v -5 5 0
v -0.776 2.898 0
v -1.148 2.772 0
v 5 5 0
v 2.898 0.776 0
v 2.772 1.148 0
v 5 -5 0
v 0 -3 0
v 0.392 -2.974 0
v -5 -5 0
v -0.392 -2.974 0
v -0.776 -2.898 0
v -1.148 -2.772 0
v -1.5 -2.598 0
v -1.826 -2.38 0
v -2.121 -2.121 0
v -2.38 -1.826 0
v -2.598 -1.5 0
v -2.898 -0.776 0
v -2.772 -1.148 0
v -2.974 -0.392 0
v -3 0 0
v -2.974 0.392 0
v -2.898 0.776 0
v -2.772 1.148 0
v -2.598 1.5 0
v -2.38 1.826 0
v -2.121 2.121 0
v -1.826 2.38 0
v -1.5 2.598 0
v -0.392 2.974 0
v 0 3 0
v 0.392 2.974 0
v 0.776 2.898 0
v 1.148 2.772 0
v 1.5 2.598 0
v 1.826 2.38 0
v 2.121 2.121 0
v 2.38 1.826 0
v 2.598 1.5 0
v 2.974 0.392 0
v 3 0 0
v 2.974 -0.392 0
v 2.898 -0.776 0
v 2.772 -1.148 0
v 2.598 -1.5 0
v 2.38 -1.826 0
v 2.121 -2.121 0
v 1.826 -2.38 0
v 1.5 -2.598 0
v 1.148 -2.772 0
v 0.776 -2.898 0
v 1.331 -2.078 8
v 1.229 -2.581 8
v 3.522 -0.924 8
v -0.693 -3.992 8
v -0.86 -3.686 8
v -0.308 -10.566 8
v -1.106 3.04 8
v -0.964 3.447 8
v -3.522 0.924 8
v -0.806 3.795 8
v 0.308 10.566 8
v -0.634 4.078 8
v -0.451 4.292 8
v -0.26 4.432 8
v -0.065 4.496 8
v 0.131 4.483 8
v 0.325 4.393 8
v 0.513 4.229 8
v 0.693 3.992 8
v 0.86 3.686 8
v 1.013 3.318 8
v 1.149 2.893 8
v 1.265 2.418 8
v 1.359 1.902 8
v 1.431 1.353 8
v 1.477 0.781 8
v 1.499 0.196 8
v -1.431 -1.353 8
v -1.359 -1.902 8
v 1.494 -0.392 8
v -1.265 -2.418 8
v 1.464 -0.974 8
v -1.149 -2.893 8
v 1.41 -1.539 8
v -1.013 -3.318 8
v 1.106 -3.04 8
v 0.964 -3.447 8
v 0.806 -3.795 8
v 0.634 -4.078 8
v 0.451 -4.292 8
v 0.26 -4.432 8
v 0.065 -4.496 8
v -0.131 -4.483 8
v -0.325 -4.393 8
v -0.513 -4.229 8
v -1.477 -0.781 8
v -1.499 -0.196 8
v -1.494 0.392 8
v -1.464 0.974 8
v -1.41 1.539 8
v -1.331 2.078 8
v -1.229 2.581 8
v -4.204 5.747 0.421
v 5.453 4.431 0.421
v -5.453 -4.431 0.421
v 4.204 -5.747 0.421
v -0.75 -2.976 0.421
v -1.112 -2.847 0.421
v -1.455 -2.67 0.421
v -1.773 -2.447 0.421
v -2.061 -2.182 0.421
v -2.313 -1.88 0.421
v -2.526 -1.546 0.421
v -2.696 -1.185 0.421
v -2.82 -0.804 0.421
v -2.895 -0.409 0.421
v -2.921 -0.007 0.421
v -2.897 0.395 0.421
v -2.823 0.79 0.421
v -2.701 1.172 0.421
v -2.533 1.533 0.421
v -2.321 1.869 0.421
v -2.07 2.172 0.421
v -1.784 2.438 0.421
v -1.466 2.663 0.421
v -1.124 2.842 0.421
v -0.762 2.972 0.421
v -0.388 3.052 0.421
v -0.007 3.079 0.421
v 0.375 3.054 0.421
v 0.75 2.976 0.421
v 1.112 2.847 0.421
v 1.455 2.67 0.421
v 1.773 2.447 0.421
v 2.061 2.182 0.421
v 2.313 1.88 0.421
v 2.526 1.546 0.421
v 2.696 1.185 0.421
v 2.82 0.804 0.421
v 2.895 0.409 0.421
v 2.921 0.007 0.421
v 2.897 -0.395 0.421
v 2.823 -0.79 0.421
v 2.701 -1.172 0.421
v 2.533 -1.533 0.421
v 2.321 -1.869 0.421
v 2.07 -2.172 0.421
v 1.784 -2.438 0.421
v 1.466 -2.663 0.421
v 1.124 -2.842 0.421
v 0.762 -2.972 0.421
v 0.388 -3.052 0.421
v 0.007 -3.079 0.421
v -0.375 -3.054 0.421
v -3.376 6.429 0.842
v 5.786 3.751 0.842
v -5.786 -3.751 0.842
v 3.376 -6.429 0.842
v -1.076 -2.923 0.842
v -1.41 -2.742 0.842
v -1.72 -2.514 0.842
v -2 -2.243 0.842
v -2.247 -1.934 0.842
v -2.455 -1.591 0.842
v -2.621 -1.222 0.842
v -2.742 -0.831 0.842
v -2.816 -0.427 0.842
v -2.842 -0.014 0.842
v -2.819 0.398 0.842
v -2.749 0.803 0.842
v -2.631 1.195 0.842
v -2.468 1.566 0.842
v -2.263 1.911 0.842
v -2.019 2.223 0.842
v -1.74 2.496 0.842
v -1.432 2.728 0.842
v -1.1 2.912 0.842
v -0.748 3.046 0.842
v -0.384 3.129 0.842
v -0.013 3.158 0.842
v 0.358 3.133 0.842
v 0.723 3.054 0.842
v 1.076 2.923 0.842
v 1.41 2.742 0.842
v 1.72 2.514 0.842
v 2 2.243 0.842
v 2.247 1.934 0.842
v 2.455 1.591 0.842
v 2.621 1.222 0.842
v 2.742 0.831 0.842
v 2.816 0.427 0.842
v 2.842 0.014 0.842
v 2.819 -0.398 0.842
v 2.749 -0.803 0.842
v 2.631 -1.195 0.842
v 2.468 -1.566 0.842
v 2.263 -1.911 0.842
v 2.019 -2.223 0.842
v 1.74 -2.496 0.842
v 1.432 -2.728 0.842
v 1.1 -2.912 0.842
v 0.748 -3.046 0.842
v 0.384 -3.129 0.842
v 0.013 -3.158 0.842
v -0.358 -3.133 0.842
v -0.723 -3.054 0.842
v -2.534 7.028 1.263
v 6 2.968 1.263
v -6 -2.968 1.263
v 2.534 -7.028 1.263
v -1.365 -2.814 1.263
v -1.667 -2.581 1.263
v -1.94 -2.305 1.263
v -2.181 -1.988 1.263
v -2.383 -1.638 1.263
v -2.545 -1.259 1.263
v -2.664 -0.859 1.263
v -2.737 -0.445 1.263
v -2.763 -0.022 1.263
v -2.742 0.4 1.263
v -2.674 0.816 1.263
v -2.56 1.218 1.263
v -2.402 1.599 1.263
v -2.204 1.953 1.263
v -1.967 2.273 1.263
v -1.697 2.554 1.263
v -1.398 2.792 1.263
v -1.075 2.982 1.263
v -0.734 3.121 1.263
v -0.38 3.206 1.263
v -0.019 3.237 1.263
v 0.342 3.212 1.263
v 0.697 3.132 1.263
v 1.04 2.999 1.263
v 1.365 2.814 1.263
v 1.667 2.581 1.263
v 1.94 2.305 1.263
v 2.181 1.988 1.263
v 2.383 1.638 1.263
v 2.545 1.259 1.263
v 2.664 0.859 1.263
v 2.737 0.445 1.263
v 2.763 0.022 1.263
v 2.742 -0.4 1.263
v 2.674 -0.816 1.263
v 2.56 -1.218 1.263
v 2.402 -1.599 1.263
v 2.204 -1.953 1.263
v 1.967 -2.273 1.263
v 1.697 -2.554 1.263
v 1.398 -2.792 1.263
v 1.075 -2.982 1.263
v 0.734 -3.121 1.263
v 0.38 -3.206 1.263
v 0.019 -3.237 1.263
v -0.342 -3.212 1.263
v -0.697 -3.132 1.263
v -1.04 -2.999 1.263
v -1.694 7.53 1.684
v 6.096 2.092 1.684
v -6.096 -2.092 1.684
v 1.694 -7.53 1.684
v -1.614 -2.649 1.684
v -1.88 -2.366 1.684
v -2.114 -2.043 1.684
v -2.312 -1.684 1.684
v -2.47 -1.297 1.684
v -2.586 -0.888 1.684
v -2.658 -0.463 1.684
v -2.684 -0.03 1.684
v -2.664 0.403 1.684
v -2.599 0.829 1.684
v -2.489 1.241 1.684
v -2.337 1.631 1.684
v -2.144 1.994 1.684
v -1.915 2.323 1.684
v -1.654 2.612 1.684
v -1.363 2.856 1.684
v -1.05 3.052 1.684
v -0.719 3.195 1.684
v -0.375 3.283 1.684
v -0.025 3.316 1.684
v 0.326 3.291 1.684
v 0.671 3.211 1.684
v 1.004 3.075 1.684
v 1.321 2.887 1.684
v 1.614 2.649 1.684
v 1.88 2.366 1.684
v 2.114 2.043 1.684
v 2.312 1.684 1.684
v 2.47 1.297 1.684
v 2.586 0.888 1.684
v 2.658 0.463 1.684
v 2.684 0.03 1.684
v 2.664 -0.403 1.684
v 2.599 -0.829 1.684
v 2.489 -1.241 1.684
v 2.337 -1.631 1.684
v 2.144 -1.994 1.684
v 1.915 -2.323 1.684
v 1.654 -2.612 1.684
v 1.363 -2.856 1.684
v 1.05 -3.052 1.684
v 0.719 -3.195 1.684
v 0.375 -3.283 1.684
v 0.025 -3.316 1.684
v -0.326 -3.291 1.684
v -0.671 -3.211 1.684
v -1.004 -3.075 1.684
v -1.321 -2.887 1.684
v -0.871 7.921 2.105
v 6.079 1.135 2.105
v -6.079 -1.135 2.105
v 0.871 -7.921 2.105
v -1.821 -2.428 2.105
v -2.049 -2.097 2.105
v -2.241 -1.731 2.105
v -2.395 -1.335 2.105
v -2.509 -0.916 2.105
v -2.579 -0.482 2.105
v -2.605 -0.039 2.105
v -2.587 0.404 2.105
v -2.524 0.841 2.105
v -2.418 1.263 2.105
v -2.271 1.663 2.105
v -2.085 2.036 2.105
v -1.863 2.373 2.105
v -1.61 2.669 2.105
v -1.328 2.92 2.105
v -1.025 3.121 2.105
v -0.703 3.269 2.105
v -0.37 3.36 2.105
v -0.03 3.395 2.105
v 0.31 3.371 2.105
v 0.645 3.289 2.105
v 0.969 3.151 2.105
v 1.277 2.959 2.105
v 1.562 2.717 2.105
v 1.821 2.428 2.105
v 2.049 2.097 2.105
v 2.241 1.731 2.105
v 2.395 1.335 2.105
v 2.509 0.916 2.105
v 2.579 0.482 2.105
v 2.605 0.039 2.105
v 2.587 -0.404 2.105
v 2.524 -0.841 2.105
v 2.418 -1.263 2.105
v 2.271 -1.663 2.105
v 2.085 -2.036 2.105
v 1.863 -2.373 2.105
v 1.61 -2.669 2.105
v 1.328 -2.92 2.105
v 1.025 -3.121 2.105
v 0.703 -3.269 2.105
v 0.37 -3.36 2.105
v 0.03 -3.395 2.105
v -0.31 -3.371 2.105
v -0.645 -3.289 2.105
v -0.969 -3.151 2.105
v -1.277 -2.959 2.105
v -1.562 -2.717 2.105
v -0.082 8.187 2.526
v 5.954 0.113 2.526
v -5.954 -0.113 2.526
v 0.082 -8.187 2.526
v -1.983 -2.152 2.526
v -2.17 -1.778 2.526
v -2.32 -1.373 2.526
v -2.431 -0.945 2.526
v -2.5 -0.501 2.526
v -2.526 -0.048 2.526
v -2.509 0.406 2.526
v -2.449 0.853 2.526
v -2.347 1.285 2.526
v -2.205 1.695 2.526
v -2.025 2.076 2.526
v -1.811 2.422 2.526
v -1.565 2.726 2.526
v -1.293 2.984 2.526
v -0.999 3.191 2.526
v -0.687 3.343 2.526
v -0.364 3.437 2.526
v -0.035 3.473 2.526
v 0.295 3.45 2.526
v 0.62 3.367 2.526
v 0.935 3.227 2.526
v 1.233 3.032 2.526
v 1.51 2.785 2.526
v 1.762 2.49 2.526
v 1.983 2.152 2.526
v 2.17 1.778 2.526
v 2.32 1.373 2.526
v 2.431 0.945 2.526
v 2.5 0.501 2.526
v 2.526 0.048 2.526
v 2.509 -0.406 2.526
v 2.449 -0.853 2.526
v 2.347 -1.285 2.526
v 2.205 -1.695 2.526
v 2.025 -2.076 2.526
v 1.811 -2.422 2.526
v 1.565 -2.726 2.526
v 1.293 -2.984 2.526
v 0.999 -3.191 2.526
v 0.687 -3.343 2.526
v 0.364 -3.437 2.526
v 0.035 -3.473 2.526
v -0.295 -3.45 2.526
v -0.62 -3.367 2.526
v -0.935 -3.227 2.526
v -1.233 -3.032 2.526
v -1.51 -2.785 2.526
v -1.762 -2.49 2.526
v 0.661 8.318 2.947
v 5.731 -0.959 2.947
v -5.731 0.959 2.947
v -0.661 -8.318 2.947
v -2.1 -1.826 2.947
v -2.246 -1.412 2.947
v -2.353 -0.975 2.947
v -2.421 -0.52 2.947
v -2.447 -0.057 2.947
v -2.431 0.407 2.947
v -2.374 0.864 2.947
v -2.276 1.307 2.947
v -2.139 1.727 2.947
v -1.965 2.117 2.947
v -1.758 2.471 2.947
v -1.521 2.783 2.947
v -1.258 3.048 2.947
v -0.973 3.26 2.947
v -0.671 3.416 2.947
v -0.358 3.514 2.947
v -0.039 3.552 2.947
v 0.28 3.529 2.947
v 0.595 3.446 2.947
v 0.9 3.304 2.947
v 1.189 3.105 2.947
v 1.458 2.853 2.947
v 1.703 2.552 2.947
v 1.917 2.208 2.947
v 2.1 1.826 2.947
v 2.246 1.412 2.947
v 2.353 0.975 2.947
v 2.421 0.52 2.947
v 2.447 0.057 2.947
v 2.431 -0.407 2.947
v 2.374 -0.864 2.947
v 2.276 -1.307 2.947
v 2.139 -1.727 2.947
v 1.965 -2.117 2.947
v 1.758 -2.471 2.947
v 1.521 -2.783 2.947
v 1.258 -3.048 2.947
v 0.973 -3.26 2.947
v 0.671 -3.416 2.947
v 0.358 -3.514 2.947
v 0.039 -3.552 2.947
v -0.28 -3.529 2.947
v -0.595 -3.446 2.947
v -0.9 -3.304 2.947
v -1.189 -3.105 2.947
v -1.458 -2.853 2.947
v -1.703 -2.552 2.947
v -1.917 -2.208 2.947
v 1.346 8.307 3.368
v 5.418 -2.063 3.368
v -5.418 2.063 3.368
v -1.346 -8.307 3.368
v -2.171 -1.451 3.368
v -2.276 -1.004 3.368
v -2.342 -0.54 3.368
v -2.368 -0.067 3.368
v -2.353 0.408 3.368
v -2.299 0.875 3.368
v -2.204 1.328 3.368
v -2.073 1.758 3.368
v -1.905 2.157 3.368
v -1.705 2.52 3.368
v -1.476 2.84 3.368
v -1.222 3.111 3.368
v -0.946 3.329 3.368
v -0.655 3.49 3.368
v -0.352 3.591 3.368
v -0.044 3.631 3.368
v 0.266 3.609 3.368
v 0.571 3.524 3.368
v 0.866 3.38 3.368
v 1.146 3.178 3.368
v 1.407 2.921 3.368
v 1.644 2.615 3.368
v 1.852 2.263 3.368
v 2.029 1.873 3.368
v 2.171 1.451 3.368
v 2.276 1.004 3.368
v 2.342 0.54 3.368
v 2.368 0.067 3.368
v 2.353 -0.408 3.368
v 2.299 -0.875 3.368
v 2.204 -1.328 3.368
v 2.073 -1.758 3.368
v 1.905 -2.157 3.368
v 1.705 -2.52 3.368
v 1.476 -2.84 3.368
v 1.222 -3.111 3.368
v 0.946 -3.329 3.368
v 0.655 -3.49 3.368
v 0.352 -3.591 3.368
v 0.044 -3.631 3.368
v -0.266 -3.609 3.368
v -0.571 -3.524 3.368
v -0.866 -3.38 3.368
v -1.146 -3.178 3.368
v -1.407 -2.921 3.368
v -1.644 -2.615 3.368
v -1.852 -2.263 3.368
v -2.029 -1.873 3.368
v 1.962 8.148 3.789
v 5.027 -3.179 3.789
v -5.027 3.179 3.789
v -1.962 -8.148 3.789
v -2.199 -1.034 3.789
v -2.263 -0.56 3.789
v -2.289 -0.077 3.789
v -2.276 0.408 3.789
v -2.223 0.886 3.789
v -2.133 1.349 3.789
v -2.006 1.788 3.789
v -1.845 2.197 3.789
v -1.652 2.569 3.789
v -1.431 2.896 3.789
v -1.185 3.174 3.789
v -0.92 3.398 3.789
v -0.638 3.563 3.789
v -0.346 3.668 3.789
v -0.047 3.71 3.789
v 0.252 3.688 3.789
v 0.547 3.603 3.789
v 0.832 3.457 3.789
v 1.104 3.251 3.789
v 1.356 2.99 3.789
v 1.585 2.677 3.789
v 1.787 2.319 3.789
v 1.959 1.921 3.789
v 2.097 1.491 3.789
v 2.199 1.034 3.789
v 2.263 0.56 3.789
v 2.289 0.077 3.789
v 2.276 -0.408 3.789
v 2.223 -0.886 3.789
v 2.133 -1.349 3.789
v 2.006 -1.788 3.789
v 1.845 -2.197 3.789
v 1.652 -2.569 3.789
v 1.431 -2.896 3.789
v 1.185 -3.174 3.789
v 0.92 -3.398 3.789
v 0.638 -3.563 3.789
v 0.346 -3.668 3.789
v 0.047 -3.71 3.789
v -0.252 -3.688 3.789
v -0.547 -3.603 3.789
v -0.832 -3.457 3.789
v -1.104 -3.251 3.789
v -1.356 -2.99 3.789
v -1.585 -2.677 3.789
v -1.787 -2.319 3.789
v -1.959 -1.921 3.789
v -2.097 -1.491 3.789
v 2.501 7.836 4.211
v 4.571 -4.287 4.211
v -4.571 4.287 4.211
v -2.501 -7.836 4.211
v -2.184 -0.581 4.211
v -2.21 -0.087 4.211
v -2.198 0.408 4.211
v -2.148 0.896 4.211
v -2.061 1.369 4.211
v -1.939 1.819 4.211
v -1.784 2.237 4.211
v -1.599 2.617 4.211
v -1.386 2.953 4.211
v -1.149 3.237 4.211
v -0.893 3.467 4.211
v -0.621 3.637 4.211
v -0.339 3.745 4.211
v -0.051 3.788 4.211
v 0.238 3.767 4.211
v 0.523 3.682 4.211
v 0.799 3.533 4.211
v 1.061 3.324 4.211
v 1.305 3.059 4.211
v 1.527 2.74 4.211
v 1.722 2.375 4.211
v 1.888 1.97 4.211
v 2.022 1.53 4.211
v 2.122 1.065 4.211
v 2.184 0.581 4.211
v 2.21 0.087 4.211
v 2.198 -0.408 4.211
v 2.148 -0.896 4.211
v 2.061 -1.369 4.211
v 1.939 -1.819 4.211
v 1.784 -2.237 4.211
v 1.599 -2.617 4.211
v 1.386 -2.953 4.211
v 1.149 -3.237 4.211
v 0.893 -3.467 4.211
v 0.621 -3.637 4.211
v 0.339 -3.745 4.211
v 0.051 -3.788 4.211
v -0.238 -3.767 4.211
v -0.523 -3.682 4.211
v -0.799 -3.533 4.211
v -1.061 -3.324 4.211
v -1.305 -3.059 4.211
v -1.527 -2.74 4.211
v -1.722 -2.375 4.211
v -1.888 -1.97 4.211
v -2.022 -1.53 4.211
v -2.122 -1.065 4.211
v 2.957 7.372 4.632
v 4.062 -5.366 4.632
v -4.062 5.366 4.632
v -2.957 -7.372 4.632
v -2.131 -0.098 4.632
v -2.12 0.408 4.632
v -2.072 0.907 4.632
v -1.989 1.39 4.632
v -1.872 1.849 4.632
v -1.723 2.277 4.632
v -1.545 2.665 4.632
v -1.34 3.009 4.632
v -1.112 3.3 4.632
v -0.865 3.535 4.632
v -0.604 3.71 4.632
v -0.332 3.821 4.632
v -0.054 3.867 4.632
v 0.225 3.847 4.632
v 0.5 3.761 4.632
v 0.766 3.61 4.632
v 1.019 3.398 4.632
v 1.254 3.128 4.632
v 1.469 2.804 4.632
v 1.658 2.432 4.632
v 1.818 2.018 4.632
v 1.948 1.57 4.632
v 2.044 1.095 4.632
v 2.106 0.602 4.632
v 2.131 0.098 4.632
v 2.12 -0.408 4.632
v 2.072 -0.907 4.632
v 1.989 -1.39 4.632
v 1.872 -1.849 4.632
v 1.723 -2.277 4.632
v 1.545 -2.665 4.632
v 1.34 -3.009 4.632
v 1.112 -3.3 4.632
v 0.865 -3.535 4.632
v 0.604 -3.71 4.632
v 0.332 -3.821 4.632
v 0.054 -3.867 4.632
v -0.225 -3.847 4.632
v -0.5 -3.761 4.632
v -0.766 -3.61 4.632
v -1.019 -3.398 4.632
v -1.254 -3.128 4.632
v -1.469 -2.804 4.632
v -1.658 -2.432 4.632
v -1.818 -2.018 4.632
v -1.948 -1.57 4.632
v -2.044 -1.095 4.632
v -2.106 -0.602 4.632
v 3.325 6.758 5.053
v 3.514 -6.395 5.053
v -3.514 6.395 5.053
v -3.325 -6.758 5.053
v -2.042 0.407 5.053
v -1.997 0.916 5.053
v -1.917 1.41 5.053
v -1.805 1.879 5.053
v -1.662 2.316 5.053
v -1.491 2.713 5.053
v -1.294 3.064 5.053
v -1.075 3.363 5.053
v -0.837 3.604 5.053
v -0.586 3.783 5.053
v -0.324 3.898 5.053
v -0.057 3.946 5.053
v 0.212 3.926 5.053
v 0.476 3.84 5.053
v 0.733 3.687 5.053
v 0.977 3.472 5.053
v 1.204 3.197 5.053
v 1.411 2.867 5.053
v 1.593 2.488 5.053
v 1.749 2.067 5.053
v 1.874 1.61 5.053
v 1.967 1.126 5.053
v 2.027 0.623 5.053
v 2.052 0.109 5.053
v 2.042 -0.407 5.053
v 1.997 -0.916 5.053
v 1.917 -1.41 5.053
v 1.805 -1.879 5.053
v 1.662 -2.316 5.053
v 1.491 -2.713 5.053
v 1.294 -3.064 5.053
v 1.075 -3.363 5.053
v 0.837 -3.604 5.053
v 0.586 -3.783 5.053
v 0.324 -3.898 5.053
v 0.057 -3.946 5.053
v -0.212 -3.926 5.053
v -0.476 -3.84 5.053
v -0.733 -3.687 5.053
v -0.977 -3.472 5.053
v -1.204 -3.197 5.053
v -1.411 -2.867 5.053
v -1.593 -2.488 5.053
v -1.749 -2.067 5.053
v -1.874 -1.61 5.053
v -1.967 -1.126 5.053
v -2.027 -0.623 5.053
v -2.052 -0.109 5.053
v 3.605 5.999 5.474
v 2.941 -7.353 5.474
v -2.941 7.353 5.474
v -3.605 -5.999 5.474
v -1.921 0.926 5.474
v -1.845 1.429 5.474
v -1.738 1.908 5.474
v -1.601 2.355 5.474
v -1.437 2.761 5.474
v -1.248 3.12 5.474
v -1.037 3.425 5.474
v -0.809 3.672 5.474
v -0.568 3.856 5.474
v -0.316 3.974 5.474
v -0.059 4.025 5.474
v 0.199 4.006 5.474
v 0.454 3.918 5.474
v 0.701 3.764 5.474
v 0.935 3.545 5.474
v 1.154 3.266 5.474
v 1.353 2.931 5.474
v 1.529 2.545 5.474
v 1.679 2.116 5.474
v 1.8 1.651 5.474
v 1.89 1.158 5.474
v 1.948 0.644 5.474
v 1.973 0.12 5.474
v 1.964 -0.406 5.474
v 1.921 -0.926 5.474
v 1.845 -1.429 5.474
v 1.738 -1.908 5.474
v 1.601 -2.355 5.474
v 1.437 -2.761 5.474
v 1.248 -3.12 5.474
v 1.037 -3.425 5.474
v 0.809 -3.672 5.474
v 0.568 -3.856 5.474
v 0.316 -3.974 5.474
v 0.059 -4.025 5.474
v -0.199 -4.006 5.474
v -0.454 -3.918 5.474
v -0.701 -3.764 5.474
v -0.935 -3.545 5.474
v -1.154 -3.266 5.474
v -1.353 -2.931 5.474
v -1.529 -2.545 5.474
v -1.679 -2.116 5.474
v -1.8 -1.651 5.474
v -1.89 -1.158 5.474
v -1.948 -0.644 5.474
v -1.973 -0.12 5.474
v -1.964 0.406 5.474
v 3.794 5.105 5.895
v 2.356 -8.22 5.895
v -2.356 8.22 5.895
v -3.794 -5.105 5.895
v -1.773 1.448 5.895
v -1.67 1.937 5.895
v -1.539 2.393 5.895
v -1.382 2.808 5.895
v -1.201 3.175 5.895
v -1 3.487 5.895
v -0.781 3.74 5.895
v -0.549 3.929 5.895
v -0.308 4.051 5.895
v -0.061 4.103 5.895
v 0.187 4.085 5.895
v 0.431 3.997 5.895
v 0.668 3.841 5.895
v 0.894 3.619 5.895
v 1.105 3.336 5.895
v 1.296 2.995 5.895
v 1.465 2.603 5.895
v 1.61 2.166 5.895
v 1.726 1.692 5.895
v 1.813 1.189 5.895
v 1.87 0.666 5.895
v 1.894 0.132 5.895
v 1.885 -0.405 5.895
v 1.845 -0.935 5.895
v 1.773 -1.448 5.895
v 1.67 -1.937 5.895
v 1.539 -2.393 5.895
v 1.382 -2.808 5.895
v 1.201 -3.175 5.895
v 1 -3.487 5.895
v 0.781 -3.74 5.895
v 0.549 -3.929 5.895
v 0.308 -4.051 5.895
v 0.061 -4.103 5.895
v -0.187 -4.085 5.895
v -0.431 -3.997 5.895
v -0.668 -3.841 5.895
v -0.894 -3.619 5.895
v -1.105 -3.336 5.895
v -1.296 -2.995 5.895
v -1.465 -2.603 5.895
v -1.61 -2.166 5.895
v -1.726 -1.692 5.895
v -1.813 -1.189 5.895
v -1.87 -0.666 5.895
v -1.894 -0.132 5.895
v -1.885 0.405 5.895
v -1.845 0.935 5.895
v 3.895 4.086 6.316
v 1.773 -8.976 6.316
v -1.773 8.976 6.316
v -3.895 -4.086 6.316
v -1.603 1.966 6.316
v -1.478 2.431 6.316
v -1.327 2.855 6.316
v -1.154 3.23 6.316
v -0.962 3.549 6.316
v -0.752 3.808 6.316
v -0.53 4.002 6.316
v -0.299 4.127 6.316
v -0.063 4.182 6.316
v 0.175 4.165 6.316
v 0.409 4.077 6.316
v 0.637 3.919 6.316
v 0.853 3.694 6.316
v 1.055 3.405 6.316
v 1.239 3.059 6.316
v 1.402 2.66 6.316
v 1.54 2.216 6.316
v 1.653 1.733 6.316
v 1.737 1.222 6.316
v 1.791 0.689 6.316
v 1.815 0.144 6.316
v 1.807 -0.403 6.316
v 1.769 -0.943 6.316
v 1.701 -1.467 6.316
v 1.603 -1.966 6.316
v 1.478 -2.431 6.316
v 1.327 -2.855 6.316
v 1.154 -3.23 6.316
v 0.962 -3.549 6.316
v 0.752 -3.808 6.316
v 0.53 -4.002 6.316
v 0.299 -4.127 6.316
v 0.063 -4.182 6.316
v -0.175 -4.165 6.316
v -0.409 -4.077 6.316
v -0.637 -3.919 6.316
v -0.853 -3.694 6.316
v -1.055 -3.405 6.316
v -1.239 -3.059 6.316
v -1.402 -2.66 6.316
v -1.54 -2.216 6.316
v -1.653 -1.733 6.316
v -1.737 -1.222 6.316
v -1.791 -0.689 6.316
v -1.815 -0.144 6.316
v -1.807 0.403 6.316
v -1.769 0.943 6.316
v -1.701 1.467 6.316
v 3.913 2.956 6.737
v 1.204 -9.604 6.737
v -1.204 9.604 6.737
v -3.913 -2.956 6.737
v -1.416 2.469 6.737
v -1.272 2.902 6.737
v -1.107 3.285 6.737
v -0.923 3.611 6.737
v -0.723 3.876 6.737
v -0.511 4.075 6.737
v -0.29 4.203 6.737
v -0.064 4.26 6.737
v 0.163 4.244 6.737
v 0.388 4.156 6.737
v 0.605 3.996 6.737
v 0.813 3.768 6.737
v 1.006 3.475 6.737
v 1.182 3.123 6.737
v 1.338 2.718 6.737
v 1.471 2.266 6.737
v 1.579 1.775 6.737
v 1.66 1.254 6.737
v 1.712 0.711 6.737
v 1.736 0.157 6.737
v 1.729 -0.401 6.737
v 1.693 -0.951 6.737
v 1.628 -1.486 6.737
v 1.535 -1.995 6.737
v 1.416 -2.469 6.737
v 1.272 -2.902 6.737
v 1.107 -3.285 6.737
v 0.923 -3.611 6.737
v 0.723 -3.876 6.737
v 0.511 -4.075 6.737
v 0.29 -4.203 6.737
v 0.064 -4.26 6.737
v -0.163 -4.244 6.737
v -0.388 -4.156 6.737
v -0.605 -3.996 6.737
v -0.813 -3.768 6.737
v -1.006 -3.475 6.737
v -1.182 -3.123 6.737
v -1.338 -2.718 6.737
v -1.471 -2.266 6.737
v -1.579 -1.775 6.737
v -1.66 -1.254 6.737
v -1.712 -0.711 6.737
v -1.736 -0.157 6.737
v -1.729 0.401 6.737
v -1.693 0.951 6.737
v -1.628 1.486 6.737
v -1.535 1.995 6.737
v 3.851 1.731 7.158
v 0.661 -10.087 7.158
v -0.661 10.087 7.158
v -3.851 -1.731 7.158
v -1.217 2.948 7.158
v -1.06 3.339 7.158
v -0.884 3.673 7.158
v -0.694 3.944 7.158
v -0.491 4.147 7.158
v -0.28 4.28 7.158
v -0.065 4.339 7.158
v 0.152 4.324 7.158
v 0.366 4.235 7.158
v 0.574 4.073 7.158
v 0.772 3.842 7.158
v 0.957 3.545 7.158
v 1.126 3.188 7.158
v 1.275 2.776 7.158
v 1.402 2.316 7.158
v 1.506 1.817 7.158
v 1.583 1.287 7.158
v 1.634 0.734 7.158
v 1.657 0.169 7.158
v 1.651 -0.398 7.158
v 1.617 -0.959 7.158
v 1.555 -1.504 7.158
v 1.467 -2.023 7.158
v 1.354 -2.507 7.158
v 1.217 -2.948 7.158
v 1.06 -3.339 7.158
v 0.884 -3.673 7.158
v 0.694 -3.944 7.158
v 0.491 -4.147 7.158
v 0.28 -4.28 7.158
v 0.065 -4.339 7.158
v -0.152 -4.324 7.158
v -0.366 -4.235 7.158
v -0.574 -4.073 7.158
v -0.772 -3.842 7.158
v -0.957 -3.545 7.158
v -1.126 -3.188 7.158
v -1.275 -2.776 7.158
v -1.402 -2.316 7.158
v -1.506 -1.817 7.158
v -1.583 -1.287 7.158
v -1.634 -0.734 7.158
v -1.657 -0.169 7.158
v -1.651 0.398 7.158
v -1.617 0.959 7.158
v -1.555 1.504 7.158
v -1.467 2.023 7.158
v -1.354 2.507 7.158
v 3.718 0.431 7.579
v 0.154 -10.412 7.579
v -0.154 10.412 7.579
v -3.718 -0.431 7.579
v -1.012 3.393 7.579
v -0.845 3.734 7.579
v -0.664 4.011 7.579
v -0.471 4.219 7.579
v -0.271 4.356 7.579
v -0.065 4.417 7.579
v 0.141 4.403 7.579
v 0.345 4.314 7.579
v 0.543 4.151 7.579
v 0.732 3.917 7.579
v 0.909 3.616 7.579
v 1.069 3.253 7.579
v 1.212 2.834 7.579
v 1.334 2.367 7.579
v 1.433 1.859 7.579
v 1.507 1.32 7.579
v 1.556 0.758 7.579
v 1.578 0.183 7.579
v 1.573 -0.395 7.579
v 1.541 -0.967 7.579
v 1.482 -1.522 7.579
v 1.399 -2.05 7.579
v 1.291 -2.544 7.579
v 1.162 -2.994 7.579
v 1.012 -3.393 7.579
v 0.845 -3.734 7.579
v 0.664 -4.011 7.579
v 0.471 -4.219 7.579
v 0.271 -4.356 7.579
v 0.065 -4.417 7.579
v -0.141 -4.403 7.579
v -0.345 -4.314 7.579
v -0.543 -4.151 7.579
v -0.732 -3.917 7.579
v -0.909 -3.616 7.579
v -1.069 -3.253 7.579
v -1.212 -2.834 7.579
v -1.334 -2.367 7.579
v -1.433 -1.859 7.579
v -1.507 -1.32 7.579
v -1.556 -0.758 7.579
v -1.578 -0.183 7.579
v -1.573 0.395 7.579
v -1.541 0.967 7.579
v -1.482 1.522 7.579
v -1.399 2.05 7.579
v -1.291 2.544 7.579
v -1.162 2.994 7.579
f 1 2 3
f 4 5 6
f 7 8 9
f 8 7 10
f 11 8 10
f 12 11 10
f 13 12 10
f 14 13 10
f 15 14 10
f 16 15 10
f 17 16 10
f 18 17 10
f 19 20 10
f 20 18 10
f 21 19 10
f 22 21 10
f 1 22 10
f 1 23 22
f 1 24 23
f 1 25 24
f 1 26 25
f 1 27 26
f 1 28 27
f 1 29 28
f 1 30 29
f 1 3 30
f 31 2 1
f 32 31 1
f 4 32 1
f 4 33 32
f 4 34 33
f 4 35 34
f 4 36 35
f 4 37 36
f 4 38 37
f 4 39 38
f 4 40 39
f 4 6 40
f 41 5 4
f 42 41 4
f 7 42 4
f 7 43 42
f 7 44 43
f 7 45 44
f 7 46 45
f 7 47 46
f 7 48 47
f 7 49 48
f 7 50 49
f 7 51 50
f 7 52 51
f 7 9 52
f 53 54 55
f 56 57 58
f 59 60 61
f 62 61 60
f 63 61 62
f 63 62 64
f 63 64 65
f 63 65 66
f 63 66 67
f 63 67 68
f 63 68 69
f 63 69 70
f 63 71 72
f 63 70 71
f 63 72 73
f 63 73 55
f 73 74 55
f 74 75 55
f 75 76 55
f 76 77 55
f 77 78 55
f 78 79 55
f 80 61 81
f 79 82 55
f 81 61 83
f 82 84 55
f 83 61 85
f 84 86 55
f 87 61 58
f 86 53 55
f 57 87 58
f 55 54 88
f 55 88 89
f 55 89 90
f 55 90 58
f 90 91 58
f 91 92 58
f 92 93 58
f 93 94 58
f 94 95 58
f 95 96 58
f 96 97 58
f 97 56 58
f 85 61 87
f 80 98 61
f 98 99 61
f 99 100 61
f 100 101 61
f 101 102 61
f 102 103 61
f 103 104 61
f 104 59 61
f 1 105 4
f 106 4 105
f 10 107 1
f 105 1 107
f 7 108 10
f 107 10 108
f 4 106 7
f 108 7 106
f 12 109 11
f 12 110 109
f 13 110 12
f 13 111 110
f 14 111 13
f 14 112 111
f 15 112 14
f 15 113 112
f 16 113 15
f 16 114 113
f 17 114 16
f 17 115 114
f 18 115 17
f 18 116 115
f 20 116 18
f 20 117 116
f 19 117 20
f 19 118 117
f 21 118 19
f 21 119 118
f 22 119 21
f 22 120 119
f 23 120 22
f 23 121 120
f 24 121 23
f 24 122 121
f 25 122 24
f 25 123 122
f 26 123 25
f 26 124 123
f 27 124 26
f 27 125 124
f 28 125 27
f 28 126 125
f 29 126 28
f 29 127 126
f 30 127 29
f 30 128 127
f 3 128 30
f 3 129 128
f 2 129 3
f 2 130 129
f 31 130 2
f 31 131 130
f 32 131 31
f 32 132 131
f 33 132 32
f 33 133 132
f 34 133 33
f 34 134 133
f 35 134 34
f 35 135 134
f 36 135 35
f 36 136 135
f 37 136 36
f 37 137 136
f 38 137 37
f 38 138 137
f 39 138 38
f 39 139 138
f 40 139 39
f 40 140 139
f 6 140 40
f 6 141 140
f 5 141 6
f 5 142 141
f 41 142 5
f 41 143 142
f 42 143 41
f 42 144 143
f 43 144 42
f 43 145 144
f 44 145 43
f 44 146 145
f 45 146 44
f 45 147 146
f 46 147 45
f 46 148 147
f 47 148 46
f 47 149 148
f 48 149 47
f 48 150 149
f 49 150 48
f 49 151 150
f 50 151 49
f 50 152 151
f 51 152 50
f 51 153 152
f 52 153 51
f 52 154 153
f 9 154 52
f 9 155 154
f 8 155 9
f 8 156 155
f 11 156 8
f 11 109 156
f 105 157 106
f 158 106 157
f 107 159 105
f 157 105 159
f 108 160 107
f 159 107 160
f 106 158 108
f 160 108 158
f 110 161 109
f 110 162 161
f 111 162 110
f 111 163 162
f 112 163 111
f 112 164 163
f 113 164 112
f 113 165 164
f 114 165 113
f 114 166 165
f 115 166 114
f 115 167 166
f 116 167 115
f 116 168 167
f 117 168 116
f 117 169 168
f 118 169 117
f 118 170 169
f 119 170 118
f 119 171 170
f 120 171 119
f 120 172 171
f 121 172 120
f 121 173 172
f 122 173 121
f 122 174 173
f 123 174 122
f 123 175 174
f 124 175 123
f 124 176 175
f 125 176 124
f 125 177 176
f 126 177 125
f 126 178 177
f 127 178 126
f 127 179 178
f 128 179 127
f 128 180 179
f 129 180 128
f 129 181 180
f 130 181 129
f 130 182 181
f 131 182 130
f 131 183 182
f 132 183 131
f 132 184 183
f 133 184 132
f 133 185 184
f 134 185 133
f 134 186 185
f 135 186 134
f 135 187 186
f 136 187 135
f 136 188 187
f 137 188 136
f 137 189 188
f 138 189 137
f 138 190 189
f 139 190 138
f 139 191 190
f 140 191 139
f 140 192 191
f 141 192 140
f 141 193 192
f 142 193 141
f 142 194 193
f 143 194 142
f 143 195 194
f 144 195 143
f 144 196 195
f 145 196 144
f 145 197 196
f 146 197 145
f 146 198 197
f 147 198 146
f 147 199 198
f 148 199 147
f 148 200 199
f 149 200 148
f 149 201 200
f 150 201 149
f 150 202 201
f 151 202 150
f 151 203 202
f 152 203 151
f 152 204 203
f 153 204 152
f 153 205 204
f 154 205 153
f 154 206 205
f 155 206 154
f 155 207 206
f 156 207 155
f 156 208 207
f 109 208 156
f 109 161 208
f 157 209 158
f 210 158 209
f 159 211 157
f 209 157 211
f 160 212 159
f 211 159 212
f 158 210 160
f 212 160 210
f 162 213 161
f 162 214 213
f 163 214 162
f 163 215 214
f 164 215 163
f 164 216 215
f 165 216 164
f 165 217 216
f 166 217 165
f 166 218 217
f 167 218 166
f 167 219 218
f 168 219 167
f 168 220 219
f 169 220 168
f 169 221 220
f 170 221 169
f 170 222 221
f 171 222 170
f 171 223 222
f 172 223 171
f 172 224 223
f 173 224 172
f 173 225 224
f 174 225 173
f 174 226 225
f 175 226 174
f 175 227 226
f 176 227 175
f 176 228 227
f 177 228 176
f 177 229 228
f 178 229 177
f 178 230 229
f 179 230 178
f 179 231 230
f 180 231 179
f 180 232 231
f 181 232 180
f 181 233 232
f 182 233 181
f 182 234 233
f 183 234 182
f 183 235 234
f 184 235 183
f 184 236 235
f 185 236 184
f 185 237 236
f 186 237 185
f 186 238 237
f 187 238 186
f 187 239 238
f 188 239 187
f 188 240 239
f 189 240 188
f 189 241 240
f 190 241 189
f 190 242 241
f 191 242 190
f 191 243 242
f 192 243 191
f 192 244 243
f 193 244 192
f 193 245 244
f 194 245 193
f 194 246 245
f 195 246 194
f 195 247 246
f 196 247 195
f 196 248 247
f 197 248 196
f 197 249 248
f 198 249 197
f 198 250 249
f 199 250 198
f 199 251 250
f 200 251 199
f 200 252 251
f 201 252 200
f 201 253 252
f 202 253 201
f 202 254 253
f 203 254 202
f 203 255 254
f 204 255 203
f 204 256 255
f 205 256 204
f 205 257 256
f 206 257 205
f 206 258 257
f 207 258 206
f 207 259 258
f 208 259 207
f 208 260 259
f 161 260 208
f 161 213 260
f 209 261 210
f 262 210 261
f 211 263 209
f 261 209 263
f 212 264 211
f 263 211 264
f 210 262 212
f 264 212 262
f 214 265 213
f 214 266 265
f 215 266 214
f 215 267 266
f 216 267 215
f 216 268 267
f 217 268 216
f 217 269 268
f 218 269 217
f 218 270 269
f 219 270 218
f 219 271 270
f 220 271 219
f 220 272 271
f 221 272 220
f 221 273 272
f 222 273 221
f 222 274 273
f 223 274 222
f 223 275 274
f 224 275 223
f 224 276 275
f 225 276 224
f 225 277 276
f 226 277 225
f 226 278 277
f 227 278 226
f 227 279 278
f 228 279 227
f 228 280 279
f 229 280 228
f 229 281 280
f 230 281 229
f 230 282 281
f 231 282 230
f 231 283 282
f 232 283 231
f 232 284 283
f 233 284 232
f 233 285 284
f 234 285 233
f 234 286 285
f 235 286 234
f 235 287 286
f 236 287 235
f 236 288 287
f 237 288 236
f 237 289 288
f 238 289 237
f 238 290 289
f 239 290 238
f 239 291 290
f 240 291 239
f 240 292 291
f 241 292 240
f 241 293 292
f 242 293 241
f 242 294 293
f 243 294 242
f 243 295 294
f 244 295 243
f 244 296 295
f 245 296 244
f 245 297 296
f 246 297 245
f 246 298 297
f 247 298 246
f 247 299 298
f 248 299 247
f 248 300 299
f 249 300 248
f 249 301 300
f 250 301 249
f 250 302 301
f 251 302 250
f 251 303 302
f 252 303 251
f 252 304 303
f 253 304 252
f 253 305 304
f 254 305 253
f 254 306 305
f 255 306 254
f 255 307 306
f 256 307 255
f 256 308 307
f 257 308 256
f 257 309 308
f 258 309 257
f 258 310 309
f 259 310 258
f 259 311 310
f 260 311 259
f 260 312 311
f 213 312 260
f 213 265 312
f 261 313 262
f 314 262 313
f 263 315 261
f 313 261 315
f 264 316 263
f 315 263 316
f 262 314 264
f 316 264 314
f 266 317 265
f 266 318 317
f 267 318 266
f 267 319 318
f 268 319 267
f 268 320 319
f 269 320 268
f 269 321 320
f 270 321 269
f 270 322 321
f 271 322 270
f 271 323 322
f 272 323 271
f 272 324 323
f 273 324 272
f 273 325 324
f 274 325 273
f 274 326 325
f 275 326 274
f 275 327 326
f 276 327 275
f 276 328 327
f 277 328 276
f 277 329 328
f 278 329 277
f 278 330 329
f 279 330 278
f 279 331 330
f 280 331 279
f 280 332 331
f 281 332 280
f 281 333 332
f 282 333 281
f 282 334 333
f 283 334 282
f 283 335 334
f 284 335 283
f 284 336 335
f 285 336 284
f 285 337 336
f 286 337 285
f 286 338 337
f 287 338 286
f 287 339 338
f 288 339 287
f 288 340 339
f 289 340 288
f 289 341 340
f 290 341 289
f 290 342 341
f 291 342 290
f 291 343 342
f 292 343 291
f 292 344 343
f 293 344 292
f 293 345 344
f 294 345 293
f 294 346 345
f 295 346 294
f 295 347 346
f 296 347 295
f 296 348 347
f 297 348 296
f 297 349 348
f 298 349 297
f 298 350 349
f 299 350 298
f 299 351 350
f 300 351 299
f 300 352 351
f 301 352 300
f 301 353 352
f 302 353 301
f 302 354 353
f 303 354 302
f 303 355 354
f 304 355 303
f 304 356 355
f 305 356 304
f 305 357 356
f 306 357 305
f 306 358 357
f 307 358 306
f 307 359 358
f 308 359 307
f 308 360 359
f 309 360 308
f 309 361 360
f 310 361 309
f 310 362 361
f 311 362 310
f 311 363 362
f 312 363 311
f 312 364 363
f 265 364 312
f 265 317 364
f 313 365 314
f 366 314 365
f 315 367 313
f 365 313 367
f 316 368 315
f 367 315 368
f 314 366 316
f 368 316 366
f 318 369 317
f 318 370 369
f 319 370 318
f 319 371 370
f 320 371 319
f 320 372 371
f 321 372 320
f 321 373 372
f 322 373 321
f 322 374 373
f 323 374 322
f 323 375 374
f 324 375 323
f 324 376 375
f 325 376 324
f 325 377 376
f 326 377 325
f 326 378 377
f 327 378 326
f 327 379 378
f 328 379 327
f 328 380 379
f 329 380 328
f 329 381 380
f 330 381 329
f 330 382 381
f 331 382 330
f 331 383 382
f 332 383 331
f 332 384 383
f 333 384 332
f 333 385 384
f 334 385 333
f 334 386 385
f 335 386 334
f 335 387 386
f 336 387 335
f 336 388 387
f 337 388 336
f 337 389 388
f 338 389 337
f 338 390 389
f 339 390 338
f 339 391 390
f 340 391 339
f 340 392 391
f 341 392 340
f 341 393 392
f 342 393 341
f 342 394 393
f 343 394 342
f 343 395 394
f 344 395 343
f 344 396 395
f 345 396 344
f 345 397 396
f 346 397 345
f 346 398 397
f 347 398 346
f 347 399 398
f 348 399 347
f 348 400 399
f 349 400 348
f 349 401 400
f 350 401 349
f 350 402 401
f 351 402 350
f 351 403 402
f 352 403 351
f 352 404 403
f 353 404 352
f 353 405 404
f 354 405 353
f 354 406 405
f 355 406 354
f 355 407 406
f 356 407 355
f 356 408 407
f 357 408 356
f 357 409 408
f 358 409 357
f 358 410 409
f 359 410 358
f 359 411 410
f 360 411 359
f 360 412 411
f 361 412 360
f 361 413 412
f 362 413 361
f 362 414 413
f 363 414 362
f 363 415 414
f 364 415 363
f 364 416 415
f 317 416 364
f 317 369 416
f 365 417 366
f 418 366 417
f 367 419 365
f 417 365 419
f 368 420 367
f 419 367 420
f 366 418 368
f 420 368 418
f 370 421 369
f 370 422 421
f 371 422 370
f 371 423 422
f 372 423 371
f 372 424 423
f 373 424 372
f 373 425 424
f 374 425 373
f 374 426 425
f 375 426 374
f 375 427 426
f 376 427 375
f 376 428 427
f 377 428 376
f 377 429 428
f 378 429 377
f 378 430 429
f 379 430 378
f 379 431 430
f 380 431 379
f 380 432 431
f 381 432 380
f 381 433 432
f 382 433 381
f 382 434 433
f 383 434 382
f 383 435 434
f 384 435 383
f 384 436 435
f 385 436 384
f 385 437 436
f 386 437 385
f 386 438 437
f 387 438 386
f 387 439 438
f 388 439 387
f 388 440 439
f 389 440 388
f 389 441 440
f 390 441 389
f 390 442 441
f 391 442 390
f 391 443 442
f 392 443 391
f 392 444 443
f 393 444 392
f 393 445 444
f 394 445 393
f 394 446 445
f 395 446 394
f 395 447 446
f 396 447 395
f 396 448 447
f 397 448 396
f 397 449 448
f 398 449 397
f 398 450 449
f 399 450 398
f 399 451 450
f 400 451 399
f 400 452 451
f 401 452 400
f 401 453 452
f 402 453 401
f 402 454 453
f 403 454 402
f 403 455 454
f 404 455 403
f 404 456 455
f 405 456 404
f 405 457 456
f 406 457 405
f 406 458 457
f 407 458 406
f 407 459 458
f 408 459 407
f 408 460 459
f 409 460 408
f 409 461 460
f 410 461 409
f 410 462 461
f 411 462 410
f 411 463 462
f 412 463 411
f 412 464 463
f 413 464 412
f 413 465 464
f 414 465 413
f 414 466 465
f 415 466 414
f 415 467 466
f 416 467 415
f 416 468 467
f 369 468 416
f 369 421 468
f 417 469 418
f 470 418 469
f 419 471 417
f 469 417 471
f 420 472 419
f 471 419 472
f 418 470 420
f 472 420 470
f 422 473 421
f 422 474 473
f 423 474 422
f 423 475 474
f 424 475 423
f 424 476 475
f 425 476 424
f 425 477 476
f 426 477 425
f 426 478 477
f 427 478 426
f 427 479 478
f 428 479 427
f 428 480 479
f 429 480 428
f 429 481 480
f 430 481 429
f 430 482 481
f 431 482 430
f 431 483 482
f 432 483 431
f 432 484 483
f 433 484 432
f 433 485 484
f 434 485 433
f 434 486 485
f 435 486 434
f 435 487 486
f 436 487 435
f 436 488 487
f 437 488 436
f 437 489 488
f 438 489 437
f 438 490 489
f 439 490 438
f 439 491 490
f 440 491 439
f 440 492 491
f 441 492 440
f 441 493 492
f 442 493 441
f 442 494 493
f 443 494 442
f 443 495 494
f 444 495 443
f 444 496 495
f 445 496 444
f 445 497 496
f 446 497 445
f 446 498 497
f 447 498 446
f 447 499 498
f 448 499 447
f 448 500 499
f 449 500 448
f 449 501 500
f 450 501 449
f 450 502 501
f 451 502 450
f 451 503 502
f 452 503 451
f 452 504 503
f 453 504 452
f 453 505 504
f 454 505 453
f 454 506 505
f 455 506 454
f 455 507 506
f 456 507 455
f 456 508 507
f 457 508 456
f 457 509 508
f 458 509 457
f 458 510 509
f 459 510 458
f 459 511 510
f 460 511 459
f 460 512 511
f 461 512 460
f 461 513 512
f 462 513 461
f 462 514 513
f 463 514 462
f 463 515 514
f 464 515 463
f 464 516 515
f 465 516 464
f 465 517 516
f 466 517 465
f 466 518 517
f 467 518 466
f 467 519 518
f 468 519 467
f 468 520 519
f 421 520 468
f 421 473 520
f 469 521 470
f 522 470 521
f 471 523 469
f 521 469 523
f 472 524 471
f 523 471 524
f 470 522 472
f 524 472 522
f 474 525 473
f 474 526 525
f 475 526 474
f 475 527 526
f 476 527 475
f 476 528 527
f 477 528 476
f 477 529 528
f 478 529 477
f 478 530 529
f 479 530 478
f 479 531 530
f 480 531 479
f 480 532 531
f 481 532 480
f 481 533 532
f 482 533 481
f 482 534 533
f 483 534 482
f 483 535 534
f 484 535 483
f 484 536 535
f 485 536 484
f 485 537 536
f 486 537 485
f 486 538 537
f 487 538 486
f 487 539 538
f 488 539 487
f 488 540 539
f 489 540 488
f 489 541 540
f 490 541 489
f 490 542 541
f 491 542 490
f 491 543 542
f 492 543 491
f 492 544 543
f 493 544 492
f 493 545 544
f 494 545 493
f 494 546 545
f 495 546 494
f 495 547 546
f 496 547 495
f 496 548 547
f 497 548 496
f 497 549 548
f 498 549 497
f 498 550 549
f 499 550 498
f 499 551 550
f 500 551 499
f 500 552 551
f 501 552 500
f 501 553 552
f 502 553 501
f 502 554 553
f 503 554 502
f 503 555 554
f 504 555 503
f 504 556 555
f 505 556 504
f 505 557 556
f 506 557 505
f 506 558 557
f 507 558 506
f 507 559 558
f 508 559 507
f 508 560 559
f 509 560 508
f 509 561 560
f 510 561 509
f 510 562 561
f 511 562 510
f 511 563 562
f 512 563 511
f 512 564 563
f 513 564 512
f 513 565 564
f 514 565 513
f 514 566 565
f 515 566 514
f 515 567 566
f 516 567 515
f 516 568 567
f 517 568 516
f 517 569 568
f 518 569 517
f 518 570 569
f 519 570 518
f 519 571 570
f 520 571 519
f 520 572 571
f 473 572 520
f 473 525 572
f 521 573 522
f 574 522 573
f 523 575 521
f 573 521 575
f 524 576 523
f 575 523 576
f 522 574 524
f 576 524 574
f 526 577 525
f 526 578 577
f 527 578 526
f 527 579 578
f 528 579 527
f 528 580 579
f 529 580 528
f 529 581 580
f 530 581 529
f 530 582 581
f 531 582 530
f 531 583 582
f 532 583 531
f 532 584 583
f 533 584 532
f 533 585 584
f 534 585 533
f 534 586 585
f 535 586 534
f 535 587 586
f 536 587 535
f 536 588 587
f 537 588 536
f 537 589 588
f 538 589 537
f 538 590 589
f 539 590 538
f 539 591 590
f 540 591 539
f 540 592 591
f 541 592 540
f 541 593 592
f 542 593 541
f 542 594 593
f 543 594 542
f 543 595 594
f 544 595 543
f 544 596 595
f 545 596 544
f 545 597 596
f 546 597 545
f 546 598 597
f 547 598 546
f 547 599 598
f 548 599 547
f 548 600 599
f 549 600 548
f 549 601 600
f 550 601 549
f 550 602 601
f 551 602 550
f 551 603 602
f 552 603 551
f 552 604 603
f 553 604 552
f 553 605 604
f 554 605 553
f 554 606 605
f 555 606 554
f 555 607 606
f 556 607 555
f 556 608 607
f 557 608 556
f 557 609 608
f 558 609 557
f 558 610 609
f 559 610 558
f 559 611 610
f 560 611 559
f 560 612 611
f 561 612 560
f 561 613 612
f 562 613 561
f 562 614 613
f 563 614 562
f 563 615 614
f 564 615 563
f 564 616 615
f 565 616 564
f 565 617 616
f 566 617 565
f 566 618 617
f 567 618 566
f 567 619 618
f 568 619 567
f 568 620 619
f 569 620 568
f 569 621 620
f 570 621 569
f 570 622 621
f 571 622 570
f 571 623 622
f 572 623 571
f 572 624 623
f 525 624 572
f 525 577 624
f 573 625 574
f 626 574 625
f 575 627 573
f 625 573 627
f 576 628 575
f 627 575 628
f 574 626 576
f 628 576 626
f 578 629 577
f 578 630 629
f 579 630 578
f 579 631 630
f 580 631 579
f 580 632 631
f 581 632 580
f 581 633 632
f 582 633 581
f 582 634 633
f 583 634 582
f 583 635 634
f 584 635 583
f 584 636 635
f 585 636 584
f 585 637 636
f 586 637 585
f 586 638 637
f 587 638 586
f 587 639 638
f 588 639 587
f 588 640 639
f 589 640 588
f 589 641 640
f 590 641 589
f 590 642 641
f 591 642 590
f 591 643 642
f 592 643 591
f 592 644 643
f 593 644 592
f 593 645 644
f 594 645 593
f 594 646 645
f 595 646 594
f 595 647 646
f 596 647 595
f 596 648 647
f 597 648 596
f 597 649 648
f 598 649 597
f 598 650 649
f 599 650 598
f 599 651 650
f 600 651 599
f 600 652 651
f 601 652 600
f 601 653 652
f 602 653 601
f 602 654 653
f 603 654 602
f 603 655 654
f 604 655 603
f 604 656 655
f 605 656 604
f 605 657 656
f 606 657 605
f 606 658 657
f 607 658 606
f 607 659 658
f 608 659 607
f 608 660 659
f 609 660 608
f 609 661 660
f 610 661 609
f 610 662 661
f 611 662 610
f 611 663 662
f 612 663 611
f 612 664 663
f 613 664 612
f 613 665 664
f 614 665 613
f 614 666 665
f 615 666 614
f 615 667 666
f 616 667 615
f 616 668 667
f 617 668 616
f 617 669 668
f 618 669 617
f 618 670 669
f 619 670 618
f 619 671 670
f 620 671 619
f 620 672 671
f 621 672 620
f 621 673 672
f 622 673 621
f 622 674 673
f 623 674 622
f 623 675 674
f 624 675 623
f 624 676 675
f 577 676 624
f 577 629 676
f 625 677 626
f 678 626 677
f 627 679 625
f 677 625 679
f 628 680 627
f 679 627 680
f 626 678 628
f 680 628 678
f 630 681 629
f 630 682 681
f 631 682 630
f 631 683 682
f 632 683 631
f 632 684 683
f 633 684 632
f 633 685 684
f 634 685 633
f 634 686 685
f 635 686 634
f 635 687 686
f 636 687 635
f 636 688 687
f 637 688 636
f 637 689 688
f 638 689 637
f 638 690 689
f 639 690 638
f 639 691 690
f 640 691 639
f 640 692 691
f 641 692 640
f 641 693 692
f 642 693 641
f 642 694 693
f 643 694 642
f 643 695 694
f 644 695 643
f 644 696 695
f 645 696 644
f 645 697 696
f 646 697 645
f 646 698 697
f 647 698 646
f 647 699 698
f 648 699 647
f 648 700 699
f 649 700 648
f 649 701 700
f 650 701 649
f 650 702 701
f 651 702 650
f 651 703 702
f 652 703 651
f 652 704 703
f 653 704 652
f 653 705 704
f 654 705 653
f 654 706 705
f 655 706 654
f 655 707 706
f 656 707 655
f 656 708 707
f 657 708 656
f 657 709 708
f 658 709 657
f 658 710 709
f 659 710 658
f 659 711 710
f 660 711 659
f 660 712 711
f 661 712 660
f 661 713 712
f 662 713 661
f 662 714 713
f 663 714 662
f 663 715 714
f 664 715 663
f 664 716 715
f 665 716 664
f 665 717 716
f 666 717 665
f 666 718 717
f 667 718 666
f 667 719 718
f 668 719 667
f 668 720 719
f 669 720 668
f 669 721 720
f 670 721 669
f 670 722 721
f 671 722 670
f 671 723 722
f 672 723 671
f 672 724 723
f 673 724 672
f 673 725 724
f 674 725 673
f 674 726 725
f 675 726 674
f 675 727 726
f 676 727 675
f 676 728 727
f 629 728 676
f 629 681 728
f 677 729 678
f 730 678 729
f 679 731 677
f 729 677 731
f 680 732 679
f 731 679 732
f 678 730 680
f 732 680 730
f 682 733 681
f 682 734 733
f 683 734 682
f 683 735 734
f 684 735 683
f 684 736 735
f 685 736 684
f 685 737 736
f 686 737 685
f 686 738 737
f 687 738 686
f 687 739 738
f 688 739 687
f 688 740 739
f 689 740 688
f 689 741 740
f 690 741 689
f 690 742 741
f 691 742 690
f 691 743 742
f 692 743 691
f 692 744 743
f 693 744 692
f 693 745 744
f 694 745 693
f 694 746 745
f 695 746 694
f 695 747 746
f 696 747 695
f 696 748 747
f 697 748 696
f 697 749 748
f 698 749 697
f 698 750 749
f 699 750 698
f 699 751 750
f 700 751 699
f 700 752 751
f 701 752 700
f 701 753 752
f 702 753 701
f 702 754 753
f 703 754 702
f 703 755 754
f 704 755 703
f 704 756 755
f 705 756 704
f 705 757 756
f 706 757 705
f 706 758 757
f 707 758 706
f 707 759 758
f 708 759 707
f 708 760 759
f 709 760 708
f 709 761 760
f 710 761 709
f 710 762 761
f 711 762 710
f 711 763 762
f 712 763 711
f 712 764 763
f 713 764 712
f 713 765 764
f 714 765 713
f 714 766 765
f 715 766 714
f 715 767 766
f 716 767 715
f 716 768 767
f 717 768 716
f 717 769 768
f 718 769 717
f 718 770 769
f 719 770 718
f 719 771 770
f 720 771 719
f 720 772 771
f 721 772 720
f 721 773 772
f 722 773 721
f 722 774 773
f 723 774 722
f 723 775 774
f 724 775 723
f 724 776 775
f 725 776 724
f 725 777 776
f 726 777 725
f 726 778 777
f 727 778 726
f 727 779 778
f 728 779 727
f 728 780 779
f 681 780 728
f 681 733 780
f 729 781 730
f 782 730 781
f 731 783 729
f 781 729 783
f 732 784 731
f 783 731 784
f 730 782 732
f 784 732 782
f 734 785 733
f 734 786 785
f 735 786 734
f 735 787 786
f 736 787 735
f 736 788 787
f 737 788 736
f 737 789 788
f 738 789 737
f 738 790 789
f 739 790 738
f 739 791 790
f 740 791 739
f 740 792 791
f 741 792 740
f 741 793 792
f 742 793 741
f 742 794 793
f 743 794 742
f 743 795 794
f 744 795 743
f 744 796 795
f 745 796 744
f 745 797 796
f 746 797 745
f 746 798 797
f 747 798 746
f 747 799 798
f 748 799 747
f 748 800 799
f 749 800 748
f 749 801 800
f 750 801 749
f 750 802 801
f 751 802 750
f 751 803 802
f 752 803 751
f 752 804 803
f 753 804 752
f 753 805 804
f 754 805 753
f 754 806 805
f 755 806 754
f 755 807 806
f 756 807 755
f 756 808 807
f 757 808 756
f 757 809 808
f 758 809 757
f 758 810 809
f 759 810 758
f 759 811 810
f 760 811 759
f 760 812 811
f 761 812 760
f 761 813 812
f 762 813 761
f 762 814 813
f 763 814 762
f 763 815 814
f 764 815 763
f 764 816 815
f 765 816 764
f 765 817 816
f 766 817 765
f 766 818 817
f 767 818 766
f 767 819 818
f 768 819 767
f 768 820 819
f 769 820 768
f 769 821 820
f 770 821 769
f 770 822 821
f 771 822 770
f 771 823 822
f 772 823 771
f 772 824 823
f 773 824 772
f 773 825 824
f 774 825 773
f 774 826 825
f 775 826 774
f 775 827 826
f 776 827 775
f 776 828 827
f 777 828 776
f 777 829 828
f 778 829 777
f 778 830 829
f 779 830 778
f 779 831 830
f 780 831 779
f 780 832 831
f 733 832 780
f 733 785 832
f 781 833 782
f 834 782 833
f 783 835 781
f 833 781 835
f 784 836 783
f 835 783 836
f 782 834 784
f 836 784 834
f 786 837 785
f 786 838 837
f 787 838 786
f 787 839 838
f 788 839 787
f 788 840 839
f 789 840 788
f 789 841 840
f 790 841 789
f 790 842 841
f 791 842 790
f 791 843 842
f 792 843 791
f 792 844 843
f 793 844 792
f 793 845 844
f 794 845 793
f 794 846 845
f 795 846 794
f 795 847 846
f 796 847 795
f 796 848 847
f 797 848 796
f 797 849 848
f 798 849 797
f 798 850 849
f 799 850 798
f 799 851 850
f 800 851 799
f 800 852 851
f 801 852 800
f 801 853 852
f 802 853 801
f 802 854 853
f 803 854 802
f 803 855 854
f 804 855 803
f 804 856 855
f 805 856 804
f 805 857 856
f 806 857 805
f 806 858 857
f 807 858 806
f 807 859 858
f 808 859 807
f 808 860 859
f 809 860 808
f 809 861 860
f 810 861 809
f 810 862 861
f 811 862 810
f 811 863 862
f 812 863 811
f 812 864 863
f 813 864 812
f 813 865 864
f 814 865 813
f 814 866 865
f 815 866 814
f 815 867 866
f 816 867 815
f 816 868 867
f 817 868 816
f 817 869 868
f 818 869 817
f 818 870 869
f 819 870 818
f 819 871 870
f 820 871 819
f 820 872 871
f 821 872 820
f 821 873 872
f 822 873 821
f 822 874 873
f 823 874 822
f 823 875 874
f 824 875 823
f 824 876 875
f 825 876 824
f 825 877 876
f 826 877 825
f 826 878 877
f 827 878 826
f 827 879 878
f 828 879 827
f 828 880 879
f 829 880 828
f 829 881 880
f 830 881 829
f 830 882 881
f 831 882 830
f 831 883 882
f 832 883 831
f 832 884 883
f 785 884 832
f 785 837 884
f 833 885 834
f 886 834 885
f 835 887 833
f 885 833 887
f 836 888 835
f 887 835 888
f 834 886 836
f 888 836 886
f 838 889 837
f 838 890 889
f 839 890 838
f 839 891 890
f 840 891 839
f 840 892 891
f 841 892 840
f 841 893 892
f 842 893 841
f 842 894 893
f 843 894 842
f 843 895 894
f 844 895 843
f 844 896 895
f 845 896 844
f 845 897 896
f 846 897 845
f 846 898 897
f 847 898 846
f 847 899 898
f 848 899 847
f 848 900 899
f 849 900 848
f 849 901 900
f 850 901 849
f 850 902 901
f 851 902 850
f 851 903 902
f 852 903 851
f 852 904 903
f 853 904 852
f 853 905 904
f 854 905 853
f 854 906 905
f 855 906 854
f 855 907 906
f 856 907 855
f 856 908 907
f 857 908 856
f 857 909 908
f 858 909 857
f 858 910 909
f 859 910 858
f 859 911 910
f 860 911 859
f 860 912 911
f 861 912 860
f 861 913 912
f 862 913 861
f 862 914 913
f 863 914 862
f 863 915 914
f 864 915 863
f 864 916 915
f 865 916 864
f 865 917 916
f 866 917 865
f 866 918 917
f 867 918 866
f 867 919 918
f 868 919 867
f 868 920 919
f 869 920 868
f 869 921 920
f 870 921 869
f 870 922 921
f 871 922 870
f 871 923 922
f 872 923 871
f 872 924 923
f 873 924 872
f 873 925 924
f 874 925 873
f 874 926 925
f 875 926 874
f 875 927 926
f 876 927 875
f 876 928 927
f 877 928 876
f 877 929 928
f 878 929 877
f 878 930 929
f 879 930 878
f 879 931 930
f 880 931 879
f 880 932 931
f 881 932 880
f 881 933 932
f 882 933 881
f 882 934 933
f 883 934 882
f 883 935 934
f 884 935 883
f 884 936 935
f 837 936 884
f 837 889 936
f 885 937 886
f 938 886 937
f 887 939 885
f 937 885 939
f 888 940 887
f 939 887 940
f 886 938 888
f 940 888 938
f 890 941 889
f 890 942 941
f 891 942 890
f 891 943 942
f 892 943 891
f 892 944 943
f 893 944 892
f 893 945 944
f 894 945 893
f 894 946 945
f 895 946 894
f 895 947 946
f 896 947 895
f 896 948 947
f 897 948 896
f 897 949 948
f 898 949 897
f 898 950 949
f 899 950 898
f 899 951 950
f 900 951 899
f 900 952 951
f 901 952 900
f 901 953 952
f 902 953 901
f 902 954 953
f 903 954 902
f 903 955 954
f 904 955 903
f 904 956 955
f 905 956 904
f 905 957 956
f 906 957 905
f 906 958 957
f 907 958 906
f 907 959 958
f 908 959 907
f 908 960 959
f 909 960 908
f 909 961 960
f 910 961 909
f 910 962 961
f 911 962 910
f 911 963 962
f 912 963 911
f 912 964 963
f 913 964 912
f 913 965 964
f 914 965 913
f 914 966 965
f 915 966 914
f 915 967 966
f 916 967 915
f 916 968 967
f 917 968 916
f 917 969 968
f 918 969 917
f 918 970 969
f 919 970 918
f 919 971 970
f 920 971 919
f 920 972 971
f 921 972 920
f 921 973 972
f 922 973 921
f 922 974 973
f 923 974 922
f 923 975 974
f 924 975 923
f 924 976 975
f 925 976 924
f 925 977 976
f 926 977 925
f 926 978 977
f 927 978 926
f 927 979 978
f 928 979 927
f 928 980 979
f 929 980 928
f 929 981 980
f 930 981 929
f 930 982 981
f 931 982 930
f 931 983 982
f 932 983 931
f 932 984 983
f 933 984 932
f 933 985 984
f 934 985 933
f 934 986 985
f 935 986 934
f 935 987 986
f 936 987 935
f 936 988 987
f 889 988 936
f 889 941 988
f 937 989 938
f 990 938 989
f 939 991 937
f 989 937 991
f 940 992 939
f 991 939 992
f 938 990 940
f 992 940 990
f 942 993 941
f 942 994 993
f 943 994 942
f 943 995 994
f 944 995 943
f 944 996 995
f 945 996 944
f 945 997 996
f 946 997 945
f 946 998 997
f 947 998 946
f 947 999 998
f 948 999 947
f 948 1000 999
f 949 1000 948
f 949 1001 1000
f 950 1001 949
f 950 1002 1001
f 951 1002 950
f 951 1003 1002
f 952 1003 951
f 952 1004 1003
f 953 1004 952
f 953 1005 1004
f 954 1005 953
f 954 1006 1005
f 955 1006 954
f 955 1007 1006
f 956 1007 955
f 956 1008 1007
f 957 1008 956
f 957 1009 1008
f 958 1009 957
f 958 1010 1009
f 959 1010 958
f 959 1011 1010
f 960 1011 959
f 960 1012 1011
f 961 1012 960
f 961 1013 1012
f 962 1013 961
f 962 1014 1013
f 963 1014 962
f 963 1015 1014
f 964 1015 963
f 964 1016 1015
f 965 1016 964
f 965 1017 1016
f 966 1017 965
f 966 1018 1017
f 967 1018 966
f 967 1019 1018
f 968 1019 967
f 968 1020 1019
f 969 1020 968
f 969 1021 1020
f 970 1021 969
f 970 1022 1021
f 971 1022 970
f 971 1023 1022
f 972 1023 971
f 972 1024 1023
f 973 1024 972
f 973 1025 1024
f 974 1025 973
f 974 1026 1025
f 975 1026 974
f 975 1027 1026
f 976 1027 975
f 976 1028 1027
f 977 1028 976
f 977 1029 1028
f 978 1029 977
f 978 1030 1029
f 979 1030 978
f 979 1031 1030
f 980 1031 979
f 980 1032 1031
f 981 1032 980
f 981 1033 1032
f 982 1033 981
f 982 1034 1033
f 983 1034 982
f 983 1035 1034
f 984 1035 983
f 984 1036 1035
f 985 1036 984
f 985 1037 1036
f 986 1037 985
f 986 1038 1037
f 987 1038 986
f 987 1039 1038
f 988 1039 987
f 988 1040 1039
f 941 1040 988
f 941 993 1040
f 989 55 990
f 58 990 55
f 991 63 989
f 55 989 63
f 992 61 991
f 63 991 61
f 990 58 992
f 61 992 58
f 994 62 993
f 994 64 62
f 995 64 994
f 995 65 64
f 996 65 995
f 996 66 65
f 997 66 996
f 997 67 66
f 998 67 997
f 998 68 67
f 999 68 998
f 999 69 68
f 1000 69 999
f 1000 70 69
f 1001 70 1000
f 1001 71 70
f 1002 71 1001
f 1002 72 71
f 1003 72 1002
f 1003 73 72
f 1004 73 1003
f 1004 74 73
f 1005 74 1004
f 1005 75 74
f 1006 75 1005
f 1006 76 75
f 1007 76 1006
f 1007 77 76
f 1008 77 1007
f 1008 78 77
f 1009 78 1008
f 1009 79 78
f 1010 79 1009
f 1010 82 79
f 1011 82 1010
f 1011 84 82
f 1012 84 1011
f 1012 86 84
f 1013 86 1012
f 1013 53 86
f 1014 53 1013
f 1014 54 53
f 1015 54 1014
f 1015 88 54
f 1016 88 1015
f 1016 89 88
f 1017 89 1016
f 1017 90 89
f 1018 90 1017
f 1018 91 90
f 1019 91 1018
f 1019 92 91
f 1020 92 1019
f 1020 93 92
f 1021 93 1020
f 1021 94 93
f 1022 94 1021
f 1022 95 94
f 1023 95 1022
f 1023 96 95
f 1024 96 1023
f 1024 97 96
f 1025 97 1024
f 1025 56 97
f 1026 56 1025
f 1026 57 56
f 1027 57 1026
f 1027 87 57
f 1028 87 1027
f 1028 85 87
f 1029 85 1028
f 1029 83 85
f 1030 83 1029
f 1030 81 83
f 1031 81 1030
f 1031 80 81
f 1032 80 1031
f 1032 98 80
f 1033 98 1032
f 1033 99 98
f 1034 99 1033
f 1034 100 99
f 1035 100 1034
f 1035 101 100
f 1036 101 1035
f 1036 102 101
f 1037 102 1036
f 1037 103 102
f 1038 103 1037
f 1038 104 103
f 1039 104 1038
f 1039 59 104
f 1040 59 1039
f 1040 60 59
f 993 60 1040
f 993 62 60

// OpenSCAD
// Combined twist + non-uniform scale over a profile with a hole: both loops are
// refined by the same peak-stretch rule and swept rotate-then-scale.
// oracle: tris
$fn=48;
linear_extrude(height=8,twist=140,scale=[0.5,1.5]) difference(){ square([10,10],center=true); circle(3); }
